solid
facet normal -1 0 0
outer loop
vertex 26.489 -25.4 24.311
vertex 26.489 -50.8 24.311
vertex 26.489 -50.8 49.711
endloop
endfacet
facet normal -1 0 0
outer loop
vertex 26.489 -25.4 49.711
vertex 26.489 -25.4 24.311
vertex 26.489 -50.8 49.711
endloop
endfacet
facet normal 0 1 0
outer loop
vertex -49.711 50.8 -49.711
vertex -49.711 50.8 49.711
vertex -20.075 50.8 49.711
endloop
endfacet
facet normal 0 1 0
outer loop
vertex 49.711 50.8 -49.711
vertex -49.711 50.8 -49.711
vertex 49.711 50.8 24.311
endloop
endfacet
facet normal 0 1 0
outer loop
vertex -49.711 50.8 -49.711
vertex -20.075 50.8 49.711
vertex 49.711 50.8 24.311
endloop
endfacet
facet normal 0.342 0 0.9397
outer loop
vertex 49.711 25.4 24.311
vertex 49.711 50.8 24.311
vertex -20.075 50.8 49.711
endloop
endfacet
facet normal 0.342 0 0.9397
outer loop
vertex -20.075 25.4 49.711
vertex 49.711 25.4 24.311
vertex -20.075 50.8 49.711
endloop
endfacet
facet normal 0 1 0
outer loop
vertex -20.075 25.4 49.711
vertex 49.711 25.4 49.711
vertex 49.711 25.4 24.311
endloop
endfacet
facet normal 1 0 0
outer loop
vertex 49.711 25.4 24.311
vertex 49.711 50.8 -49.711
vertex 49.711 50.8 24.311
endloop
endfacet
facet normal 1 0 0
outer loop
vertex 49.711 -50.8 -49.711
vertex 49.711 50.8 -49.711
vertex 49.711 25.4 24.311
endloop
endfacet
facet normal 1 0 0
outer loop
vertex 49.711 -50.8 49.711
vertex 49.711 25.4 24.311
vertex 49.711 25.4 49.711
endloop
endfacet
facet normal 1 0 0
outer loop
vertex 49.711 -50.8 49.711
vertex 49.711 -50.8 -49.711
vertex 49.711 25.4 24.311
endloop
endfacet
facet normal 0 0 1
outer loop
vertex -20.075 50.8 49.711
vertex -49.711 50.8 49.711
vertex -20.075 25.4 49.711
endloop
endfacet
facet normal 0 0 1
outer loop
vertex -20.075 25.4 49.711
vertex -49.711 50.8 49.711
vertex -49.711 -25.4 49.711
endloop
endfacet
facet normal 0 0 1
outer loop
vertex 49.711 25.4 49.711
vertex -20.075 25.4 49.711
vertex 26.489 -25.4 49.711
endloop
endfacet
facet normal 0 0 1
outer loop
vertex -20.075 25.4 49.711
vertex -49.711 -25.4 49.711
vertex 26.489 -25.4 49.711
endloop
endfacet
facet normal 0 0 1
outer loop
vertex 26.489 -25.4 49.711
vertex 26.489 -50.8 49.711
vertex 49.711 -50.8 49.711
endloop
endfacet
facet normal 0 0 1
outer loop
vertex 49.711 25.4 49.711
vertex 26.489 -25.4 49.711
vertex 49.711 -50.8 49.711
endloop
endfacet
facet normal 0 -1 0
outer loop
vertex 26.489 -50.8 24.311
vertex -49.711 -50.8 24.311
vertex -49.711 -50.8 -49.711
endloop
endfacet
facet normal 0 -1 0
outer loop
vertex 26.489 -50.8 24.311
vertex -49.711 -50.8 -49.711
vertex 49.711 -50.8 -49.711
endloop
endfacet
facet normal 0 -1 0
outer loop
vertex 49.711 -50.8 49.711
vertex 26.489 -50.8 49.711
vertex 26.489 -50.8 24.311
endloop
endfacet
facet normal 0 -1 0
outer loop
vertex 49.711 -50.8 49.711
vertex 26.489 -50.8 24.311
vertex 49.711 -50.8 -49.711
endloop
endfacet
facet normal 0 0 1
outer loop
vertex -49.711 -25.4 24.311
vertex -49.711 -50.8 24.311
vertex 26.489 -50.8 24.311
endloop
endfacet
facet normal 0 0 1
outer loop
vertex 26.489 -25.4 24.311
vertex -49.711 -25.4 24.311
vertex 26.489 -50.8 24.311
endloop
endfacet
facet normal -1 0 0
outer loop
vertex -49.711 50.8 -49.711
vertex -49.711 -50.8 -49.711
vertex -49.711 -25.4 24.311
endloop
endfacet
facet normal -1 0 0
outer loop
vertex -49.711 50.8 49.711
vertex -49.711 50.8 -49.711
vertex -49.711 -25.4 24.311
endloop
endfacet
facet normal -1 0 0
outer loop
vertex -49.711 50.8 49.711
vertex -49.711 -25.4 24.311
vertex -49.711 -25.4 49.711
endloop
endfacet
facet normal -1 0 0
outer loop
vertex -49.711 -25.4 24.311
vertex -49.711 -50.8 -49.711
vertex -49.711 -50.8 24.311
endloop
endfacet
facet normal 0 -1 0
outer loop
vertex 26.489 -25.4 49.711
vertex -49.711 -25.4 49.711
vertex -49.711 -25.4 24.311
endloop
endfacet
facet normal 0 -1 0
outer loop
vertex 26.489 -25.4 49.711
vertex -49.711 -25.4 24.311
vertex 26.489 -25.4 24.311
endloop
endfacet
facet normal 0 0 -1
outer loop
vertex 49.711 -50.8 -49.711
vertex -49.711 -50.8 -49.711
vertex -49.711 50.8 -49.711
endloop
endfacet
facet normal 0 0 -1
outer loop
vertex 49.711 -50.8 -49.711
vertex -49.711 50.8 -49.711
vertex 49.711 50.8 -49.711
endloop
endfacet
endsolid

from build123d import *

# Parameters (mm, degrees)
F0_W     = 99.4218587875
F0_H     = 99.4218587875
F1_DEPTH = 50.8
F2_W     = 76.2
F2_H     = 25.4
F3_DEPTH = 25.4
F5_DEPTH = 25.4


with BuildPart() as f1:
    # F0 (on Front) → F1 (new body, symmetric)
    with BuildSketch(Plane.XZ):
        Rectangle(F0_W, F0_H)
    extrude(amount=F1_DEPTH, both=True)

    # F2 (on face) → F3 (cut)
    with BuildSketch(Plane.XZ.offset(50.8)):
        with Locations((-11.6109293938, 37.0109293938)):
            Rectangle(F2_W, F2_H)
    extrude(amount=-F3_DEPTH, mode=Mode.SUBTRACT)

    # F4 (on face) → F5 (cut)
    with BuildSketch(Plane(origin=(0, 50.8, 0), x_dir=(-1, 0, 0), z_dir=(0, 1, 0))):
        Polygon((-49.7109293938, 24.3109293938), (20.0749970604, 49.7109293938), (-49.7109293938, 49.7109293938), align=None)
    extrude(amount=-F5_DEPTH, mode=Mode.SUBTRACT)


solid = f1.part
